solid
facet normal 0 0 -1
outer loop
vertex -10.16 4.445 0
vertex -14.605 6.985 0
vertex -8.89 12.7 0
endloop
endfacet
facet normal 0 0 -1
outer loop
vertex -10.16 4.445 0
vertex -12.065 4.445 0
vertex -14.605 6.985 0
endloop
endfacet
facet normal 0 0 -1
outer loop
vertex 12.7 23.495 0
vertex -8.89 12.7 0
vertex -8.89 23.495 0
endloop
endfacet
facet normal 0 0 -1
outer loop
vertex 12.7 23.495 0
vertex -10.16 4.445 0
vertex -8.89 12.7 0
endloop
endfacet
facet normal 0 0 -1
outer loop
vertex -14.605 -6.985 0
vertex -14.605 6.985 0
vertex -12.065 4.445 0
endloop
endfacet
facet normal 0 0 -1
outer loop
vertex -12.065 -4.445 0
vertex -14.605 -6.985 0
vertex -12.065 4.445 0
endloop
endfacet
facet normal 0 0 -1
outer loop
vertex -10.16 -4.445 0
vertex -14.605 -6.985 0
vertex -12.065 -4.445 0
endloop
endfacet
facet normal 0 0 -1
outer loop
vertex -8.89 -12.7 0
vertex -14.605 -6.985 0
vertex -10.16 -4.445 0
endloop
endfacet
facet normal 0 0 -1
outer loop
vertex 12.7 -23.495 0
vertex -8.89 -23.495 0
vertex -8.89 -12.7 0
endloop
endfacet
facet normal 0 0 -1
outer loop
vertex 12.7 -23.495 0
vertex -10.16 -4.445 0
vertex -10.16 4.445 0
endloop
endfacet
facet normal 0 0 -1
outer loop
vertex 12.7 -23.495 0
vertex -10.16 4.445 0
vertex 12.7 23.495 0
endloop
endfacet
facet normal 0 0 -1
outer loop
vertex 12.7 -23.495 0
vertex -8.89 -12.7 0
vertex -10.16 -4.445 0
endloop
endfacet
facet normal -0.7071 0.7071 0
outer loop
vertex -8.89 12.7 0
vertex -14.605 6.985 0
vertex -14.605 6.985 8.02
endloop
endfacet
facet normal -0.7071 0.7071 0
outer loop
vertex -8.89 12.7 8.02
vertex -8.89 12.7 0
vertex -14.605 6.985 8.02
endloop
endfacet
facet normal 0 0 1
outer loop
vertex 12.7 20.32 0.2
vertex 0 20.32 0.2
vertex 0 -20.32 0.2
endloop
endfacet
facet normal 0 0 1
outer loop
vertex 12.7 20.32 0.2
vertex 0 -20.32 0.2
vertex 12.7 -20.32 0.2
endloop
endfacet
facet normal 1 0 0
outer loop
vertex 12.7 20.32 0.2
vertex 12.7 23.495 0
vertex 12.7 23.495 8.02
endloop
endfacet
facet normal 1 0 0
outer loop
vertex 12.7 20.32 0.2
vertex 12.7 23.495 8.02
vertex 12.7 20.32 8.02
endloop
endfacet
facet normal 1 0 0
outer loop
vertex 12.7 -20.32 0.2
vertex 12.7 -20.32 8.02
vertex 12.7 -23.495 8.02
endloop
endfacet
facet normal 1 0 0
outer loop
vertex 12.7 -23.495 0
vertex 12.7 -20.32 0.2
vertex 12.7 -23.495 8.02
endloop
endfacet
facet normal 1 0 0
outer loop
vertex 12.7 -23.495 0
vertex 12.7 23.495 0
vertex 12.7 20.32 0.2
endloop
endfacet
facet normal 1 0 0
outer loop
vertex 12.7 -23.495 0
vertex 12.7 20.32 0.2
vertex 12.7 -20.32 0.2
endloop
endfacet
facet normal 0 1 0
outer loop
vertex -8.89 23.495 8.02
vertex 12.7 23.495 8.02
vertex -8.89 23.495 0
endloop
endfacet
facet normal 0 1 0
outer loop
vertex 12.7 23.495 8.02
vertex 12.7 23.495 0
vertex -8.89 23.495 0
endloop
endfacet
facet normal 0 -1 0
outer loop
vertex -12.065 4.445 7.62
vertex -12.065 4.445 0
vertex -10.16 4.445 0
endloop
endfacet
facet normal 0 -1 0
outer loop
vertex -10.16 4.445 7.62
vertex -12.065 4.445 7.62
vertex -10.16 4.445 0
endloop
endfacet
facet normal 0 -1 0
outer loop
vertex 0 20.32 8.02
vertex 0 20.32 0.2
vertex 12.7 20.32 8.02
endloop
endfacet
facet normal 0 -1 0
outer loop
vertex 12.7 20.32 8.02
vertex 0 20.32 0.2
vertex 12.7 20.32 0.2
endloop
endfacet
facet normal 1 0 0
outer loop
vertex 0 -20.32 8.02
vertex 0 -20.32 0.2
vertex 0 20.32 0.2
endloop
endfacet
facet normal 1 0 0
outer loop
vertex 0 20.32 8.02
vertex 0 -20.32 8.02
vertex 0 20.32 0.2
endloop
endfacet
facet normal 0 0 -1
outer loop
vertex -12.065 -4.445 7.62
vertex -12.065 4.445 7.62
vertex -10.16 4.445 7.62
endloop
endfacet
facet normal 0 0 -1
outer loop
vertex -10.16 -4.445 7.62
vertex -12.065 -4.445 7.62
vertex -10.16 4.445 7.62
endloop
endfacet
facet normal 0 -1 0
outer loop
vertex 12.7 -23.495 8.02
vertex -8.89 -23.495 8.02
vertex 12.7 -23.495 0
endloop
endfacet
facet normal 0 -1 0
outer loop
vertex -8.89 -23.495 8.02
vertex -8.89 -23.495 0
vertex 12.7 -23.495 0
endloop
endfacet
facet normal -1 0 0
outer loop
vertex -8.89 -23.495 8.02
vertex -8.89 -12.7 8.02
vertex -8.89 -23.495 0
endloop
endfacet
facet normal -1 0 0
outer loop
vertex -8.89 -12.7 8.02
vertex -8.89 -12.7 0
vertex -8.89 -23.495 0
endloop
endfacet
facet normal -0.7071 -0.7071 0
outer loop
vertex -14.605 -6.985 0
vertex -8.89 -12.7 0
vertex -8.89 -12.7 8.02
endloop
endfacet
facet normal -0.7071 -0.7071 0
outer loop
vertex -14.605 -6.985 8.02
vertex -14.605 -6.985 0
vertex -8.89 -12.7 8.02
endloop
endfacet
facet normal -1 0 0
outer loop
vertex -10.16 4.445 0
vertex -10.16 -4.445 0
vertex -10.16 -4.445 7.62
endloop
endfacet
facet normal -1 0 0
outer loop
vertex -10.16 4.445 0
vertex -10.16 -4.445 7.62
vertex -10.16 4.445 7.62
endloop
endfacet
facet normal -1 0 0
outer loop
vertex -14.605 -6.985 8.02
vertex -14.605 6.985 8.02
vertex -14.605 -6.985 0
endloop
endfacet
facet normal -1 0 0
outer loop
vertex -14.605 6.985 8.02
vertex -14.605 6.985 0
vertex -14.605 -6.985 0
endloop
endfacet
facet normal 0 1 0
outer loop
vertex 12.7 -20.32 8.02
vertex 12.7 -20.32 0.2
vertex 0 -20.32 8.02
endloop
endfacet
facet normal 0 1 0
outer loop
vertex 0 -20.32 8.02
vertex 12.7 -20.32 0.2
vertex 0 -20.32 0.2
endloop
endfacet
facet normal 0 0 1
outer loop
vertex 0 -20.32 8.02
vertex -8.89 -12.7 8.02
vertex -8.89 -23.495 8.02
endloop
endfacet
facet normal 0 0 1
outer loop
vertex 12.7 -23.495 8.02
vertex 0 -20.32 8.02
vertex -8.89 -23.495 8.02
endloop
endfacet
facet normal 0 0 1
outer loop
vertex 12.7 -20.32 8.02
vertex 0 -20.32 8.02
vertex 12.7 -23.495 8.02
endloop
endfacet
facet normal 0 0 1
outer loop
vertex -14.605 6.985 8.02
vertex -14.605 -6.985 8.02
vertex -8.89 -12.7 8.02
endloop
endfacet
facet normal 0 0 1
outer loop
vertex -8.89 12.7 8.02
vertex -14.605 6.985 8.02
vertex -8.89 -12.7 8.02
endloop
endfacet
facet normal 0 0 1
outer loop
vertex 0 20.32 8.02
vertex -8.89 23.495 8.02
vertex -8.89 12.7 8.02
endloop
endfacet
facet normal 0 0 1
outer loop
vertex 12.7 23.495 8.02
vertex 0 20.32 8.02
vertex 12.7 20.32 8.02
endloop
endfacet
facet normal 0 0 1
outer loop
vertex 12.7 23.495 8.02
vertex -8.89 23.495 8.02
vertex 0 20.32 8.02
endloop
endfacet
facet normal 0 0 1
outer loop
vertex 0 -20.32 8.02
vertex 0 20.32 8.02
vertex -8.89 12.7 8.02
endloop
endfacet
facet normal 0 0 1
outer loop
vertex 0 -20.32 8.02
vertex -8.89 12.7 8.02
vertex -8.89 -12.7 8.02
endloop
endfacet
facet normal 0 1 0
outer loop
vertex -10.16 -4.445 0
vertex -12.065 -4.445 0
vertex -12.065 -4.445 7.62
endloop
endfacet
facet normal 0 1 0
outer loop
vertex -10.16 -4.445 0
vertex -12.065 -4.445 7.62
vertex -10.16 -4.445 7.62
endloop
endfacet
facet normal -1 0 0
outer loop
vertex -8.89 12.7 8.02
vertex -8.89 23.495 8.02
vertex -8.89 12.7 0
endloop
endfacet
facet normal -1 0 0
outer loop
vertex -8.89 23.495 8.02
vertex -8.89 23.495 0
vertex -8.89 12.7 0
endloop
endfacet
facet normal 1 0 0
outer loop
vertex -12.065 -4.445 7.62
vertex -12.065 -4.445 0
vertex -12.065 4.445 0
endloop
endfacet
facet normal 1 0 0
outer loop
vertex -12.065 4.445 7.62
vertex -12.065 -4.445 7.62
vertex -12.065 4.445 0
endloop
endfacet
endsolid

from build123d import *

# Parameters (mm, degrees)
F0_W     = 1.905
F0_H     = 8.89
F1_DEPTH = 7.62
F3_DEPTH = 0.4
F4_W     = 12.7
F4_H     = 40.64
F5_DEPTH = 0.2
F6_SIZE  = 5.71499


# Not quite as in the source:
# - a fillet or chamfer is up to 0.001 mm smaller than in the source, because OpenCascade refuses the exact size


with BuildPart() as f1:
    # F0 (on Top) → F1 (new body)
    with BuildSketch(Plane.XY):
        Polygon((-14.605, 6.985), (-14.605, 0), (-14.605, -6.985), (-8.89, -6.985), (-8.89, -23.495), (12.7, -23.495), (12.7, -20.32), (0, -20.32), (0, 0), (0, 20.32), (12.7, 20.32), (12.7, 23.495), (-8.89, 23.495), (-8.89, 6.985), align=None)
        with Locations((-11.1125, 0)):
            Rectangle(F0_W, F0_H, mode=Mode.SUBTRACT)
    extrude(amount=F1_DEPTH)

    # F2 (on face) → F3 (join)
    with BuildSketch(Plane.XY.offset(7.62)):
        Polygon((0, -20.32), (0, 20.32), (12.7, 20.32), (12.7, 23.495), (-8.89, 23.495), (-8.89, 6.985), (-14.605, 6.985), (-14.605, -6.985), (-8.89, -6.985), (-8.89, -23.495), (12.7, -23.495), (12.7, -20.32), align=None)
    extrude(amount=F3_DEPTH)

    # F4 (on face) → F5 (join)
    with BuildSketch(Plane(origin=(0, 0, 0), x_dir=(1, 0, 0), z_dir=(0, 0, -1))):
        with Locations((6.35, 0)):
            Rectangle(F4_W, F4_H)
    extrude(amount=-F5_DEPTH)

    # F6 (size 5.715 in the source; OpenCascade refuses exactly that, so slightly less here)
    f6_edges = [f1.edges().sort_by_distance(p)[0] for p in [
        (-8.89, 6.985, 4.01),
        (-8.89, -6.985, 4.01),
    ]]
    chamfer(f6_edges, length=F6_SIZE)


solid = f1.part
